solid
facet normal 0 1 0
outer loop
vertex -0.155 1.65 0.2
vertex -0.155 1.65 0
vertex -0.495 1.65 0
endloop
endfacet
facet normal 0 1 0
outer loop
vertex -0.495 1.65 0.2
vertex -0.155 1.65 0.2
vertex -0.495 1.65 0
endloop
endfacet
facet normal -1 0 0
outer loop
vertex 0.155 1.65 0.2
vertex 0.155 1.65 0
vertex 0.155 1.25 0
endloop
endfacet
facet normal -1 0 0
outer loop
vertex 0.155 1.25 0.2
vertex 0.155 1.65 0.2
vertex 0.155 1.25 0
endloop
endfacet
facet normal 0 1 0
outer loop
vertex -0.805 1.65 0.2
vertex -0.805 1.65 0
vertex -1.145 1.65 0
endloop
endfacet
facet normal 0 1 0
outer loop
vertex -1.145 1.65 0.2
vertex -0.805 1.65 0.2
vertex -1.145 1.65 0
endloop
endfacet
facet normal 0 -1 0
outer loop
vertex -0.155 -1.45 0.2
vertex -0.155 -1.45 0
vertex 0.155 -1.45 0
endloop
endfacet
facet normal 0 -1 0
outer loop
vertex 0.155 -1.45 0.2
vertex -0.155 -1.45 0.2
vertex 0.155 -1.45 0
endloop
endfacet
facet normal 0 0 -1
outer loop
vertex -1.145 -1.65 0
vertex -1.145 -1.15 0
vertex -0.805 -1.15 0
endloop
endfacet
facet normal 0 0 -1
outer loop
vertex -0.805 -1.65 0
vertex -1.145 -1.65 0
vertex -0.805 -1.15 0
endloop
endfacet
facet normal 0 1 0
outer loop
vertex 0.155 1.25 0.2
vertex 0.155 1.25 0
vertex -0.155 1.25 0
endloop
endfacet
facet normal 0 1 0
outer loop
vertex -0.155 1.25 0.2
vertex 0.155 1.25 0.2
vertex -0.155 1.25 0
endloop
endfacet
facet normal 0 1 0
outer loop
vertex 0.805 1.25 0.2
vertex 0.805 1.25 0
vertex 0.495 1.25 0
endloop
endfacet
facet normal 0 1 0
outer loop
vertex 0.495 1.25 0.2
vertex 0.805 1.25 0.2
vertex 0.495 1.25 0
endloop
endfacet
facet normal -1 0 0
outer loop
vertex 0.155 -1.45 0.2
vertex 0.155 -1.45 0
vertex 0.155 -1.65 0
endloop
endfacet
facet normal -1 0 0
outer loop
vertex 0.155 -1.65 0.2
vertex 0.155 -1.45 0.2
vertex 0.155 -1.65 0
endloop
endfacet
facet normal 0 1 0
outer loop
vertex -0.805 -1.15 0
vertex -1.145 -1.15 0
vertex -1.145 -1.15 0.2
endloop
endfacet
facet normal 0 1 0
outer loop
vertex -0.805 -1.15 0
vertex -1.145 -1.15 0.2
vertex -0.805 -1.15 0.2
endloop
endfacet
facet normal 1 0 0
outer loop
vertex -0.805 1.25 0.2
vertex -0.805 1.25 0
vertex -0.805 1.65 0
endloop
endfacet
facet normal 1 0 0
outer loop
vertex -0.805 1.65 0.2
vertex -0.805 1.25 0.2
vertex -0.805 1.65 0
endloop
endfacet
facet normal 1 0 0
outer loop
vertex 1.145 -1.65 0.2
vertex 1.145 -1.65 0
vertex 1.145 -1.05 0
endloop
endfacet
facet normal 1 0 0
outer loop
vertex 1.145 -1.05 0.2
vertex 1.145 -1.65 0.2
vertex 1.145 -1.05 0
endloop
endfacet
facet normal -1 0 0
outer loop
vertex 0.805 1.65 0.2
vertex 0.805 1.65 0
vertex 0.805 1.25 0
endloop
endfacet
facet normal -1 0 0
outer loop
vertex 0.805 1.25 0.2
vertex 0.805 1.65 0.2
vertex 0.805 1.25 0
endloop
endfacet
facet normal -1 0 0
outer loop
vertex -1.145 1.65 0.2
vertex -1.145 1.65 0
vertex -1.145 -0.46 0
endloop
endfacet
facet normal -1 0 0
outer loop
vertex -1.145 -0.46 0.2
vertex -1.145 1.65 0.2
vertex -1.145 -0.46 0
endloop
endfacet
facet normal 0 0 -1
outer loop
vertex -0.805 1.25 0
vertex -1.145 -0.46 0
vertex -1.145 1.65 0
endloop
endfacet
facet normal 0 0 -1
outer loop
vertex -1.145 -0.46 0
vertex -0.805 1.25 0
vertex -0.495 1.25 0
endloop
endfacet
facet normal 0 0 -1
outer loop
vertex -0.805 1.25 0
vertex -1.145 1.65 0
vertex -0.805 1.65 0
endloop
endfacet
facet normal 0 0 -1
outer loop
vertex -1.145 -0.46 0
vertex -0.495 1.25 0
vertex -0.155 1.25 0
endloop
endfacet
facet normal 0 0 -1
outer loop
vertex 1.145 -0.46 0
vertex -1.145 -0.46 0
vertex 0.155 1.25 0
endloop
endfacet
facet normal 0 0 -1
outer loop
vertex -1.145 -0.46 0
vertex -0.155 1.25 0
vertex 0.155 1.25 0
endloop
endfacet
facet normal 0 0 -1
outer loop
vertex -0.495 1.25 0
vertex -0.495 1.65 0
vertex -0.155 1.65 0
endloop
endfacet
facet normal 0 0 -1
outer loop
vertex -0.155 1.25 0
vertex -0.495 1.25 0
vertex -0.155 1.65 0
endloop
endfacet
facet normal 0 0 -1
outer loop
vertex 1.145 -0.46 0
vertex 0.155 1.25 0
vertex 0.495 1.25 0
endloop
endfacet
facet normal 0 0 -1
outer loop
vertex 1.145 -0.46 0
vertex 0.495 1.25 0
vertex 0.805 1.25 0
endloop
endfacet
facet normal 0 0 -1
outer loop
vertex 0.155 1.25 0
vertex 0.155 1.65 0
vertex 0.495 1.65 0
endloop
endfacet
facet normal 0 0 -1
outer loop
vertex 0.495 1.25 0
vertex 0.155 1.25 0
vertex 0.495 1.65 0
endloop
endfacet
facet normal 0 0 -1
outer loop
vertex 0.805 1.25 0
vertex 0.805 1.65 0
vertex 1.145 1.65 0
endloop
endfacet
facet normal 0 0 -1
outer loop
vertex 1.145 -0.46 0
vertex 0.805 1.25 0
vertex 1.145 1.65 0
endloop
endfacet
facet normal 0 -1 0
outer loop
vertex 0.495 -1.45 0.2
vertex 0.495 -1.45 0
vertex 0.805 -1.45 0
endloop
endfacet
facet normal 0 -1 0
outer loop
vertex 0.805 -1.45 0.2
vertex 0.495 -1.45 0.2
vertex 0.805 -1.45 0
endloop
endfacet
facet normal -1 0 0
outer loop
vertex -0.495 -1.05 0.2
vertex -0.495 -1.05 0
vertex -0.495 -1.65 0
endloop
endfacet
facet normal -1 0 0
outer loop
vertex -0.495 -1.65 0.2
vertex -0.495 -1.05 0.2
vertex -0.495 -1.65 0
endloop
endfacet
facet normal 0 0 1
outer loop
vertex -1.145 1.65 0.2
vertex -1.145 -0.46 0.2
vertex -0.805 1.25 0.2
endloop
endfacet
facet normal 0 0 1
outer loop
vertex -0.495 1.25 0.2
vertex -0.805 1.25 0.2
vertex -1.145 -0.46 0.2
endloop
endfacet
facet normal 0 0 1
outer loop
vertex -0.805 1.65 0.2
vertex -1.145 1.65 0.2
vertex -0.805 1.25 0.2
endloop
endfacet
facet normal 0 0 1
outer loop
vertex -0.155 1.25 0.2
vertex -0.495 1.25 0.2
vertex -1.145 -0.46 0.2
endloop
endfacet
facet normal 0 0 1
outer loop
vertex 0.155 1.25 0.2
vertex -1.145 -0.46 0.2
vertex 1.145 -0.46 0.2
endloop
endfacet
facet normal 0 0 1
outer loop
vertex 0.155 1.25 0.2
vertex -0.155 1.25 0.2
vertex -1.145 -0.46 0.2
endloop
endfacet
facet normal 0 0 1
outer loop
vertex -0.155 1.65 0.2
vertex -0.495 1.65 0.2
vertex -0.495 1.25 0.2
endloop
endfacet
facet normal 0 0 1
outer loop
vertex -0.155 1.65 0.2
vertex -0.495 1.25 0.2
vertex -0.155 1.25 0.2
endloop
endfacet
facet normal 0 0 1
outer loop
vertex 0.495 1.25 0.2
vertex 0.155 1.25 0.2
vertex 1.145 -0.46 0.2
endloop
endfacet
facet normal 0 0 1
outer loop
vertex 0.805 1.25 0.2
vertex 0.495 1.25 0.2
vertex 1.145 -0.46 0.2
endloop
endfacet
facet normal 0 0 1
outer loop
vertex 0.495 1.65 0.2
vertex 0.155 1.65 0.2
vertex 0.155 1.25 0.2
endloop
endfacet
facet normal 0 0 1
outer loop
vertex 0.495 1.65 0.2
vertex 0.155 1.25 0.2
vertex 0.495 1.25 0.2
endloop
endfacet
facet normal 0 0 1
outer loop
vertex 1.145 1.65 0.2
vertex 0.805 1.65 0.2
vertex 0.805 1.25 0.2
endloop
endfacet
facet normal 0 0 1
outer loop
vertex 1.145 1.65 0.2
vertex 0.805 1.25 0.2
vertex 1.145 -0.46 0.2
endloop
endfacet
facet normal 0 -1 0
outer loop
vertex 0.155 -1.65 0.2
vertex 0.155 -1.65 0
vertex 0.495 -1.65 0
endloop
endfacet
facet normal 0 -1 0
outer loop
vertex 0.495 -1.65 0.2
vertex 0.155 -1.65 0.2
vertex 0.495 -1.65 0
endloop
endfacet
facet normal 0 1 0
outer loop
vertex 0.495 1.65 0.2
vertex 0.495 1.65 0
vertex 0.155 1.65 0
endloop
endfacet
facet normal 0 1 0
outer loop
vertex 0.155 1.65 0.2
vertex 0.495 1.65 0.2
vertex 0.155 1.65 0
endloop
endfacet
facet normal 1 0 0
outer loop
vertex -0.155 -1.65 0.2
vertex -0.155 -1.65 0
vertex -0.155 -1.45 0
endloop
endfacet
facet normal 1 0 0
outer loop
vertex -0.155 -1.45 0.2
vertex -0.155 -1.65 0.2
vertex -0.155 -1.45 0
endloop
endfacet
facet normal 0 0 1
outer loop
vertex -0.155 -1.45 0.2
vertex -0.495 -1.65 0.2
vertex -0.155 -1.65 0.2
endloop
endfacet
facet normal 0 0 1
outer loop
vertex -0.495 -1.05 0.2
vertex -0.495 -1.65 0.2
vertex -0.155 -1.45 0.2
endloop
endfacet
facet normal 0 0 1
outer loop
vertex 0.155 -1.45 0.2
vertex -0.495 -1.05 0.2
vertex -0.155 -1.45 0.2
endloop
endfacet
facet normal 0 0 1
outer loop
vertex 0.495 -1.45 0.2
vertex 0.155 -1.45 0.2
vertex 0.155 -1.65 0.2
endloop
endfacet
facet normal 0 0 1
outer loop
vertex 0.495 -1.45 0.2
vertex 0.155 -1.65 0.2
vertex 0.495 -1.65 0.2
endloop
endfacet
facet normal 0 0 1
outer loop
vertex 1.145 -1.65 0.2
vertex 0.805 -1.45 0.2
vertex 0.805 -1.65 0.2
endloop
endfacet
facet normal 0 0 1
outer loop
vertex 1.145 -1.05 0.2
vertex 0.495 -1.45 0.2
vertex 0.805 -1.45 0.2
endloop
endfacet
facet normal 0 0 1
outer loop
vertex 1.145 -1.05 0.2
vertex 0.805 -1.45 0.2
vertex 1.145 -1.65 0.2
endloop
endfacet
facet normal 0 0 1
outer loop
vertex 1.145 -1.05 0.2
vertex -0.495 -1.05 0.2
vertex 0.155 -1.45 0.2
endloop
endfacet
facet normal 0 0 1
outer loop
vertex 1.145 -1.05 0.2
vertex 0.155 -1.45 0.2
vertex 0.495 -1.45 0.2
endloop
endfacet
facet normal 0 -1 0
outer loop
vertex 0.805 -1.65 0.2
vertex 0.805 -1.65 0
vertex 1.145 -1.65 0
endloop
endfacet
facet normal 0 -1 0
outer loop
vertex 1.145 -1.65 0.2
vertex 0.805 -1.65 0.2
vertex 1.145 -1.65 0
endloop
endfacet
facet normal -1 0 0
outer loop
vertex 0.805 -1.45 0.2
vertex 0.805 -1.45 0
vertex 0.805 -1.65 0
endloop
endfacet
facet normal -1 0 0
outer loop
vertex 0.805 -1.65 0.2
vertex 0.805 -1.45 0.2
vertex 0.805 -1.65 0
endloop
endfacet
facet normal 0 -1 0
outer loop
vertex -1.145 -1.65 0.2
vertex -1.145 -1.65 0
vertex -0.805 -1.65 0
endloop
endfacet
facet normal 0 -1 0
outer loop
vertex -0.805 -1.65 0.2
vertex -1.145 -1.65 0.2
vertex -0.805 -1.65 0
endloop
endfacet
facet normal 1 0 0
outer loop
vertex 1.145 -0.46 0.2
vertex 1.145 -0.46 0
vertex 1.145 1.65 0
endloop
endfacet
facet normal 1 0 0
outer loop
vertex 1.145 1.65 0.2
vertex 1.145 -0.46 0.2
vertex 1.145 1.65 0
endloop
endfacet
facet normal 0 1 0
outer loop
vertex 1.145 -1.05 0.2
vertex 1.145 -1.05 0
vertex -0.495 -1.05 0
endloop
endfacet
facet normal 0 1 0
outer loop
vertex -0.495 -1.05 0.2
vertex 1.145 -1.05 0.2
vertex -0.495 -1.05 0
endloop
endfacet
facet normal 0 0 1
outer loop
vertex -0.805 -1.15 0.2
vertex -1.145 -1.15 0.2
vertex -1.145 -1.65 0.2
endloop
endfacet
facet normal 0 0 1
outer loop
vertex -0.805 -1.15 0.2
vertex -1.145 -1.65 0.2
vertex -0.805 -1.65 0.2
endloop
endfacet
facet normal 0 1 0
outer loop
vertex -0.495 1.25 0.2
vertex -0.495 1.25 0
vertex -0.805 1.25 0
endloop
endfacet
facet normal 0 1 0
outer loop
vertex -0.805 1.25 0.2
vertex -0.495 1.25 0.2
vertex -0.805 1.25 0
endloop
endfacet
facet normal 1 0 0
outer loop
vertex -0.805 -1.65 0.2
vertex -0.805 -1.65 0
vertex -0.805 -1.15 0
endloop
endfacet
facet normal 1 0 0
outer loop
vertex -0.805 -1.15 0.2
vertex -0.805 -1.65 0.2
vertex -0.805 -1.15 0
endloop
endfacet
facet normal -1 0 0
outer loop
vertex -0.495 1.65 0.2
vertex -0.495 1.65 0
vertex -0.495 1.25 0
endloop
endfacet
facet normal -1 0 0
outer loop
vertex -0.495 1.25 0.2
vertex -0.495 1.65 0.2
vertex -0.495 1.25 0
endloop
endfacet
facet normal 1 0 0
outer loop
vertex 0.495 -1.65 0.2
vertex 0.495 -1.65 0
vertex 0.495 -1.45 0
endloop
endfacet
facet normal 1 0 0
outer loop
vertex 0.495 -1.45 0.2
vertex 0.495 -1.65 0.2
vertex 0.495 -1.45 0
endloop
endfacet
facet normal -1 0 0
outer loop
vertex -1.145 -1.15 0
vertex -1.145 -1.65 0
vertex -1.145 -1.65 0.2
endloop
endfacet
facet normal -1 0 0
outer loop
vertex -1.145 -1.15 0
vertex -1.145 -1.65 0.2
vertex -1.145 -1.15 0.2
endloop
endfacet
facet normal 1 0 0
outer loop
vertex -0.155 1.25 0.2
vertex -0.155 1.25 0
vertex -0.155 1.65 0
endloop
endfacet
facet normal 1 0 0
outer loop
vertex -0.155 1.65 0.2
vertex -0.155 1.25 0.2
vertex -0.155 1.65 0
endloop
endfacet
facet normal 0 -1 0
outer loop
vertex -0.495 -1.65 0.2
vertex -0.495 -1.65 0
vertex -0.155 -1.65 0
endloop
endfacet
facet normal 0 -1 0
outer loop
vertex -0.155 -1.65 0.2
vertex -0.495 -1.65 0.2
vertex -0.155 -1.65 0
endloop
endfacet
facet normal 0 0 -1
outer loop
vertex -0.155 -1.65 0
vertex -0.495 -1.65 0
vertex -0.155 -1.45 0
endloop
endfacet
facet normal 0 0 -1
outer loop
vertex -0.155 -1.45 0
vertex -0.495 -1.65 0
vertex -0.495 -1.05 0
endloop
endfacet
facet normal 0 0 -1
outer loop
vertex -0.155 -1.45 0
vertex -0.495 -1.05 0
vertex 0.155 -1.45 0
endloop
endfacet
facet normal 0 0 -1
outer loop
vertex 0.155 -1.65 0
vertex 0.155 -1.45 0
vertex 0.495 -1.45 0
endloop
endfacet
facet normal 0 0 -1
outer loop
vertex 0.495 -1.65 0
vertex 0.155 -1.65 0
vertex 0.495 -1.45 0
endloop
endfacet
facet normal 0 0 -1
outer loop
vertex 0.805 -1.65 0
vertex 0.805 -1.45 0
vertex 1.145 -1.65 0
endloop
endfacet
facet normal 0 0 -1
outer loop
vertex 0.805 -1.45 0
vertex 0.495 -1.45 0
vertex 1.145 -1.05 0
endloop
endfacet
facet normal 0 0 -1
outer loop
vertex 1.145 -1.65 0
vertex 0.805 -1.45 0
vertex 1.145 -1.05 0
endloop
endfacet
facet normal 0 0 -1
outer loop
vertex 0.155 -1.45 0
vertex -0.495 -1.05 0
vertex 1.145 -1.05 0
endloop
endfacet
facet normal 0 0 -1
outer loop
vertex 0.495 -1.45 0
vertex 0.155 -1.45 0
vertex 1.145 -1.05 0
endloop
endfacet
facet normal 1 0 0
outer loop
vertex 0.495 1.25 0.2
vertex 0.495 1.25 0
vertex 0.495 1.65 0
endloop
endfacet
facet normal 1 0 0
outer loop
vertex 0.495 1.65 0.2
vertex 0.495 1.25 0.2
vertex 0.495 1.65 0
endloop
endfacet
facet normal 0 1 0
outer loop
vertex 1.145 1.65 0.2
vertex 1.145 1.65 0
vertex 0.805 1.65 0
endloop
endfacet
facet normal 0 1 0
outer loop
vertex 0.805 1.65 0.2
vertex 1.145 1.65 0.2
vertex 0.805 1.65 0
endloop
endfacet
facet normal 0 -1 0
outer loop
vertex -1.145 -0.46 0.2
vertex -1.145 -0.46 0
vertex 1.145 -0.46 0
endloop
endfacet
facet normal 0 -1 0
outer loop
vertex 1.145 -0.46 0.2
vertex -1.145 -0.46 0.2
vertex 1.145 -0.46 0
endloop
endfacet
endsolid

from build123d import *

# Parameters (mm, degrees)
EXTRUDE_1_DEPTH   = 0.2
EXTRUDE_1_2_DEPTH = 0.2
SKETCH_2_W        = 0.34
SKETCH_2_H        = 0.5
EXTRUDE_1_3_DEPTH = 0.2


with BuildPart() as part:
    # Эскиз2 → Бобышка-Вытянуть1 (new body)
    with BuildSketch(Plane.XY):
        Polygon((-1.145, 1.65), (-1.145, -0.46), (1.145, -0.46), (1.145, 1.65), (0.805, 1.65), (0.805, 1.25), (0.495, 1.25), (0.495, 1.65), (0.155, 1.65), (0.155, 1.25), (-0.155, 1.25), (-0.155, 1.65), (-0.495, 1.65), (-0.495, 1.25), (-0.805, 1.25), (-0.805, 1.65), align=None)
    extrude(amount=EXTRUDE_1_DEPTH)


with BuildPart() as body_2:
    # Эскиз2 → Extrude 1 2 (new body)
    with BuildSketch(Plane.XY):
        Polygon((1.145, -1.65), (1.145, -1.05), (-0.495, -1.05), (-0.495, -1.65), (-0.155, -1.65), (-0.155, -1.45), (0.155, -1.45), (0.155, -1.65), (0.495, -1.65), (0.495, -1.45), (0.805, -1.45), (0.805, -1.65), align=None)
    extrude(amount=EXTRUDE_1_2_DEPTH)


with BuildPart() as body_3:
    # Эскиз2 → Extrude 1 3 (new body)
    with BuildSketch(Plane.XY):
        with Locations((-0.975, -1.4)):
            Rectangle(SKETCH_2_W, SKETCH_2_H)
    extrude(amount=EXTRUDE_1_3_DEPTH)


solid = Compound([part.part, body_2.part, body_3.part])
